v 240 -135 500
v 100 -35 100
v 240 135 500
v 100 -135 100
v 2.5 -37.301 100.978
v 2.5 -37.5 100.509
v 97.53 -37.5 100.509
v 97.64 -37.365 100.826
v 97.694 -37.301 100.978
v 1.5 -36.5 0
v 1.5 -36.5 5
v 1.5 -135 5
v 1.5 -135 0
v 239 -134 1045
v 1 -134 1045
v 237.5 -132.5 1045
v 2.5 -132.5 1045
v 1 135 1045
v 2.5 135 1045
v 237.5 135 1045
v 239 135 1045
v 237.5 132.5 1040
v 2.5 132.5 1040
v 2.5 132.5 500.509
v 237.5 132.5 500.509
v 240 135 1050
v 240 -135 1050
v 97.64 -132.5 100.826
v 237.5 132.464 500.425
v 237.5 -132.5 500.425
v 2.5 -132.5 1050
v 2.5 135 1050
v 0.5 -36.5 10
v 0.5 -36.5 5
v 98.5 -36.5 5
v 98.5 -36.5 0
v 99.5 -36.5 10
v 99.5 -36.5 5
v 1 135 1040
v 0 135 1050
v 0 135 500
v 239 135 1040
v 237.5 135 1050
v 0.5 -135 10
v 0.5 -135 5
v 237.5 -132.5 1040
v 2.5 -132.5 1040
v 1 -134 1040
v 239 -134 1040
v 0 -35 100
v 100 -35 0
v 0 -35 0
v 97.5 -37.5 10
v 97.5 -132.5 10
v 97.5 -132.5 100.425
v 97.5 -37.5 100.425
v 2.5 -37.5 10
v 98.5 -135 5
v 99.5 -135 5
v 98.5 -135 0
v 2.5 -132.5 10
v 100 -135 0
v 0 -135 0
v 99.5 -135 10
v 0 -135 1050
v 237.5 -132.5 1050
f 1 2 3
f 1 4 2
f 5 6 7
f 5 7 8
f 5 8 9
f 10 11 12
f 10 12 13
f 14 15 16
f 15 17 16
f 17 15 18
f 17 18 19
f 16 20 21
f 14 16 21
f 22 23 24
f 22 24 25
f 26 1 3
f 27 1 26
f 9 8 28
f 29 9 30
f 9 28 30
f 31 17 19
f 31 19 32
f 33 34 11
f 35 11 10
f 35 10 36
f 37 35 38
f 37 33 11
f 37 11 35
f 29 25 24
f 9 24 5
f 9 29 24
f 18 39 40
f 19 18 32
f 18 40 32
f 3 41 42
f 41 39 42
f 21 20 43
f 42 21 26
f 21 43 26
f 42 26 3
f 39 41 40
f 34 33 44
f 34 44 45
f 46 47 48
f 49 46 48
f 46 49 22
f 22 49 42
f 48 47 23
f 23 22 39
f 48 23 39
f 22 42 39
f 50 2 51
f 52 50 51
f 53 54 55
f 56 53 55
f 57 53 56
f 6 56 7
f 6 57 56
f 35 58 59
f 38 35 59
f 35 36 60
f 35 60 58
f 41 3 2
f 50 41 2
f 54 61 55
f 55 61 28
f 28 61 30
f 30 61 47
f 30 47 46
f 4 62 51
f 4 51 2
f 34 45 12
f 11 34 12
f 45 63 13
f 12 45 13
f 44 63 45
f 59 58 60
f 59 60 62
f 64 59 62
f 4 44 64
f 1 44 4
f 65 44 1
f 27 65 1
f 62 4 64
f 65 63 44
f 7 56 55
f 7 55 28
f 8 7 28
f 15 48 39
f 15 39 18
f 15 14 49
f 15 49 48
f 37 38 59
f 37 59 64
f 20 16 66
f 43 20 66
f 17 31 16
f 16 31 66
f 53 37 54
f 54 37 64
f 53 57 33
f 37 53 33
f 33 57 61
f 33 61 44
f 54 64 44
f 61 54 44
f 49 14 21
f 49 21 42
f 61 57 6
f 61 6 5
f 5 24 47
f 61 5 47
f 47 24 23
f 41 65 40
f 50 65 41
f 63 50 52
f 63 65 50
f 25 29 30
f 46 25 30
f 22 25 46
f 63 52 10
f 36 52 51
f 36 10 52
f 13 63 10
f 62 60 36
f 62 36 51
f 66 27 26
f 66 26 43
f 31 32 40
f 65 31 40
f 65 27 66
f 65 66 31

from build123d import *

# Parameters (mm, degrees)
F0_W        = 100
F0_H        = 100
F1_DEPTH    = 135
F3_DEPTH    = 240
F4_T        = 2.5
F4_T3_DEPTH = 105
F4_T5_DEPTH = 105
F6_DEPTH    = 98.5
F7_W        = 235
F7_H        = 5
F8_DEPTH    = 2.5
F9_DEPTH    = 269


# Not quite as in the source:
# - a shell that OpenCascade refuses in one call is made with other operations: the cavity is built on its own and cut out


with BuildPart() as f1:
    # F0 (on Front) → F1 (new body, symmetric)
    with BuildSketch(Plane.XZ):
        Polygon((0, 500), (0, 100), (100, 100), (240, 500), (240, 1050), (0, 1050), align=None)
        with Locations((50, 50)):
            Rectangle(F0_W, F0_H)
    extrude(amount=F1_DEPTH, both=True)

    # F2 (on face) → F3 (cut)
    with BuildSketch(Plane.YZ.offset(240)):
        Polygon((135, 0), (135, 500), (-35, 100), (-35, 0), align=None)
    extrude(amount=-F3_DEPTH, mode=Mode.SUBTRACT)

    # F4: shell of thickness 2.5, made by hand


with BuildPart() as f4_core1:
    # F4_t2: copy of F1
    add(f1.part)

    # the walls: a layer under each face that stays
    f4_faces = [f4_core1.faces().sort_by_distance(p)[0] for p in [
        (0, 0, 525),
        (120, -135, 525),
        (100, -85, 50),
        (50, -35, 50),
        (120, 50, 300),
        (120, 135, 775),
        (170, 0, 300),
        (240, 0, 775),
    ]]
    thicken(f4_faces, amount=-F4_T, mode=Mode.SUBTRACT)

    # F4_s4 → F4_t3 (cut)
    with BuildSketch(Plane.XZ.offset(32.5)):
        Polygon((100.0485964589, 99.9917412394), (97.5, 100), (97.5, 100.4248643216), (97.6403541091, 100.8258760618), align=None)
    extrude(amount=F4_T3_DEPTH, mode=Mode.SUBTRACT)

    # F4_s6 → F4_t5 (cut)
    with BuildSketch(Plane.YZ.offset(-2.5)):
        Polygon((-34.951991727, 99.990221484), (-37.5, 100), (-37.5, 100.5092099447), (-37.3008272961, 100.9778516009), align=None)
    extrude(amount=F4_T5_DEPTH, mode=Mode.SUBTRACT)


with BuildPart() as f1_1:
    add(f1.part)

    # what is left inside the walls is the cavity
    f4_cavity = [f4_core1.part.solids().sort_by_distance(p)[0] for p in [
        (2.525, 44.166667, 525),
    ]]
    add(f4_cavity, mode=Mode.SUBTRACT)

    # F5 (on face) → F6 (cut)
    with BuildSketch(Plane.XZ.offset(135)):
        Polygon((1.5, 5), (1.5, 0), (98.5, 0), (98.5, 5), (99.5, 5), (99.5, 10), (0.5, 10), (0.5, 5), align=None)
    extrude(amount=-F6_DEPTH, mode=Mode.SUBTRACT)

    # F7 (on face) → F8 (cut)
    with BuildSketch(Plane(origin=(0, 135, 0), x_dir=(-1, 0, 0), z_dir=(0, 1, 0))):
        with Locations((-120, 1047.5)):
            Rectangle(F7_W, F7_H)
    extrude(amount=-F8_DEPTH, mode=Mode.SUBTRACT)

    # F7 (on face) → F9 (cut)
    with BuildSketch(Plane(origin=(0, 135, 0), x_dir=(-1, 0, 0), z_dir=(0, 1, 0))):
        Polygon((-2.5, 1045), (-237.5, 1045), (-239, 1045), (-239, 1040), (-1, 1040), (-1, 1045), align=None)
    extrude(amount=-F9_DEPTH, mode=Mode.SUBTRACT)


solid = f1_1.part
